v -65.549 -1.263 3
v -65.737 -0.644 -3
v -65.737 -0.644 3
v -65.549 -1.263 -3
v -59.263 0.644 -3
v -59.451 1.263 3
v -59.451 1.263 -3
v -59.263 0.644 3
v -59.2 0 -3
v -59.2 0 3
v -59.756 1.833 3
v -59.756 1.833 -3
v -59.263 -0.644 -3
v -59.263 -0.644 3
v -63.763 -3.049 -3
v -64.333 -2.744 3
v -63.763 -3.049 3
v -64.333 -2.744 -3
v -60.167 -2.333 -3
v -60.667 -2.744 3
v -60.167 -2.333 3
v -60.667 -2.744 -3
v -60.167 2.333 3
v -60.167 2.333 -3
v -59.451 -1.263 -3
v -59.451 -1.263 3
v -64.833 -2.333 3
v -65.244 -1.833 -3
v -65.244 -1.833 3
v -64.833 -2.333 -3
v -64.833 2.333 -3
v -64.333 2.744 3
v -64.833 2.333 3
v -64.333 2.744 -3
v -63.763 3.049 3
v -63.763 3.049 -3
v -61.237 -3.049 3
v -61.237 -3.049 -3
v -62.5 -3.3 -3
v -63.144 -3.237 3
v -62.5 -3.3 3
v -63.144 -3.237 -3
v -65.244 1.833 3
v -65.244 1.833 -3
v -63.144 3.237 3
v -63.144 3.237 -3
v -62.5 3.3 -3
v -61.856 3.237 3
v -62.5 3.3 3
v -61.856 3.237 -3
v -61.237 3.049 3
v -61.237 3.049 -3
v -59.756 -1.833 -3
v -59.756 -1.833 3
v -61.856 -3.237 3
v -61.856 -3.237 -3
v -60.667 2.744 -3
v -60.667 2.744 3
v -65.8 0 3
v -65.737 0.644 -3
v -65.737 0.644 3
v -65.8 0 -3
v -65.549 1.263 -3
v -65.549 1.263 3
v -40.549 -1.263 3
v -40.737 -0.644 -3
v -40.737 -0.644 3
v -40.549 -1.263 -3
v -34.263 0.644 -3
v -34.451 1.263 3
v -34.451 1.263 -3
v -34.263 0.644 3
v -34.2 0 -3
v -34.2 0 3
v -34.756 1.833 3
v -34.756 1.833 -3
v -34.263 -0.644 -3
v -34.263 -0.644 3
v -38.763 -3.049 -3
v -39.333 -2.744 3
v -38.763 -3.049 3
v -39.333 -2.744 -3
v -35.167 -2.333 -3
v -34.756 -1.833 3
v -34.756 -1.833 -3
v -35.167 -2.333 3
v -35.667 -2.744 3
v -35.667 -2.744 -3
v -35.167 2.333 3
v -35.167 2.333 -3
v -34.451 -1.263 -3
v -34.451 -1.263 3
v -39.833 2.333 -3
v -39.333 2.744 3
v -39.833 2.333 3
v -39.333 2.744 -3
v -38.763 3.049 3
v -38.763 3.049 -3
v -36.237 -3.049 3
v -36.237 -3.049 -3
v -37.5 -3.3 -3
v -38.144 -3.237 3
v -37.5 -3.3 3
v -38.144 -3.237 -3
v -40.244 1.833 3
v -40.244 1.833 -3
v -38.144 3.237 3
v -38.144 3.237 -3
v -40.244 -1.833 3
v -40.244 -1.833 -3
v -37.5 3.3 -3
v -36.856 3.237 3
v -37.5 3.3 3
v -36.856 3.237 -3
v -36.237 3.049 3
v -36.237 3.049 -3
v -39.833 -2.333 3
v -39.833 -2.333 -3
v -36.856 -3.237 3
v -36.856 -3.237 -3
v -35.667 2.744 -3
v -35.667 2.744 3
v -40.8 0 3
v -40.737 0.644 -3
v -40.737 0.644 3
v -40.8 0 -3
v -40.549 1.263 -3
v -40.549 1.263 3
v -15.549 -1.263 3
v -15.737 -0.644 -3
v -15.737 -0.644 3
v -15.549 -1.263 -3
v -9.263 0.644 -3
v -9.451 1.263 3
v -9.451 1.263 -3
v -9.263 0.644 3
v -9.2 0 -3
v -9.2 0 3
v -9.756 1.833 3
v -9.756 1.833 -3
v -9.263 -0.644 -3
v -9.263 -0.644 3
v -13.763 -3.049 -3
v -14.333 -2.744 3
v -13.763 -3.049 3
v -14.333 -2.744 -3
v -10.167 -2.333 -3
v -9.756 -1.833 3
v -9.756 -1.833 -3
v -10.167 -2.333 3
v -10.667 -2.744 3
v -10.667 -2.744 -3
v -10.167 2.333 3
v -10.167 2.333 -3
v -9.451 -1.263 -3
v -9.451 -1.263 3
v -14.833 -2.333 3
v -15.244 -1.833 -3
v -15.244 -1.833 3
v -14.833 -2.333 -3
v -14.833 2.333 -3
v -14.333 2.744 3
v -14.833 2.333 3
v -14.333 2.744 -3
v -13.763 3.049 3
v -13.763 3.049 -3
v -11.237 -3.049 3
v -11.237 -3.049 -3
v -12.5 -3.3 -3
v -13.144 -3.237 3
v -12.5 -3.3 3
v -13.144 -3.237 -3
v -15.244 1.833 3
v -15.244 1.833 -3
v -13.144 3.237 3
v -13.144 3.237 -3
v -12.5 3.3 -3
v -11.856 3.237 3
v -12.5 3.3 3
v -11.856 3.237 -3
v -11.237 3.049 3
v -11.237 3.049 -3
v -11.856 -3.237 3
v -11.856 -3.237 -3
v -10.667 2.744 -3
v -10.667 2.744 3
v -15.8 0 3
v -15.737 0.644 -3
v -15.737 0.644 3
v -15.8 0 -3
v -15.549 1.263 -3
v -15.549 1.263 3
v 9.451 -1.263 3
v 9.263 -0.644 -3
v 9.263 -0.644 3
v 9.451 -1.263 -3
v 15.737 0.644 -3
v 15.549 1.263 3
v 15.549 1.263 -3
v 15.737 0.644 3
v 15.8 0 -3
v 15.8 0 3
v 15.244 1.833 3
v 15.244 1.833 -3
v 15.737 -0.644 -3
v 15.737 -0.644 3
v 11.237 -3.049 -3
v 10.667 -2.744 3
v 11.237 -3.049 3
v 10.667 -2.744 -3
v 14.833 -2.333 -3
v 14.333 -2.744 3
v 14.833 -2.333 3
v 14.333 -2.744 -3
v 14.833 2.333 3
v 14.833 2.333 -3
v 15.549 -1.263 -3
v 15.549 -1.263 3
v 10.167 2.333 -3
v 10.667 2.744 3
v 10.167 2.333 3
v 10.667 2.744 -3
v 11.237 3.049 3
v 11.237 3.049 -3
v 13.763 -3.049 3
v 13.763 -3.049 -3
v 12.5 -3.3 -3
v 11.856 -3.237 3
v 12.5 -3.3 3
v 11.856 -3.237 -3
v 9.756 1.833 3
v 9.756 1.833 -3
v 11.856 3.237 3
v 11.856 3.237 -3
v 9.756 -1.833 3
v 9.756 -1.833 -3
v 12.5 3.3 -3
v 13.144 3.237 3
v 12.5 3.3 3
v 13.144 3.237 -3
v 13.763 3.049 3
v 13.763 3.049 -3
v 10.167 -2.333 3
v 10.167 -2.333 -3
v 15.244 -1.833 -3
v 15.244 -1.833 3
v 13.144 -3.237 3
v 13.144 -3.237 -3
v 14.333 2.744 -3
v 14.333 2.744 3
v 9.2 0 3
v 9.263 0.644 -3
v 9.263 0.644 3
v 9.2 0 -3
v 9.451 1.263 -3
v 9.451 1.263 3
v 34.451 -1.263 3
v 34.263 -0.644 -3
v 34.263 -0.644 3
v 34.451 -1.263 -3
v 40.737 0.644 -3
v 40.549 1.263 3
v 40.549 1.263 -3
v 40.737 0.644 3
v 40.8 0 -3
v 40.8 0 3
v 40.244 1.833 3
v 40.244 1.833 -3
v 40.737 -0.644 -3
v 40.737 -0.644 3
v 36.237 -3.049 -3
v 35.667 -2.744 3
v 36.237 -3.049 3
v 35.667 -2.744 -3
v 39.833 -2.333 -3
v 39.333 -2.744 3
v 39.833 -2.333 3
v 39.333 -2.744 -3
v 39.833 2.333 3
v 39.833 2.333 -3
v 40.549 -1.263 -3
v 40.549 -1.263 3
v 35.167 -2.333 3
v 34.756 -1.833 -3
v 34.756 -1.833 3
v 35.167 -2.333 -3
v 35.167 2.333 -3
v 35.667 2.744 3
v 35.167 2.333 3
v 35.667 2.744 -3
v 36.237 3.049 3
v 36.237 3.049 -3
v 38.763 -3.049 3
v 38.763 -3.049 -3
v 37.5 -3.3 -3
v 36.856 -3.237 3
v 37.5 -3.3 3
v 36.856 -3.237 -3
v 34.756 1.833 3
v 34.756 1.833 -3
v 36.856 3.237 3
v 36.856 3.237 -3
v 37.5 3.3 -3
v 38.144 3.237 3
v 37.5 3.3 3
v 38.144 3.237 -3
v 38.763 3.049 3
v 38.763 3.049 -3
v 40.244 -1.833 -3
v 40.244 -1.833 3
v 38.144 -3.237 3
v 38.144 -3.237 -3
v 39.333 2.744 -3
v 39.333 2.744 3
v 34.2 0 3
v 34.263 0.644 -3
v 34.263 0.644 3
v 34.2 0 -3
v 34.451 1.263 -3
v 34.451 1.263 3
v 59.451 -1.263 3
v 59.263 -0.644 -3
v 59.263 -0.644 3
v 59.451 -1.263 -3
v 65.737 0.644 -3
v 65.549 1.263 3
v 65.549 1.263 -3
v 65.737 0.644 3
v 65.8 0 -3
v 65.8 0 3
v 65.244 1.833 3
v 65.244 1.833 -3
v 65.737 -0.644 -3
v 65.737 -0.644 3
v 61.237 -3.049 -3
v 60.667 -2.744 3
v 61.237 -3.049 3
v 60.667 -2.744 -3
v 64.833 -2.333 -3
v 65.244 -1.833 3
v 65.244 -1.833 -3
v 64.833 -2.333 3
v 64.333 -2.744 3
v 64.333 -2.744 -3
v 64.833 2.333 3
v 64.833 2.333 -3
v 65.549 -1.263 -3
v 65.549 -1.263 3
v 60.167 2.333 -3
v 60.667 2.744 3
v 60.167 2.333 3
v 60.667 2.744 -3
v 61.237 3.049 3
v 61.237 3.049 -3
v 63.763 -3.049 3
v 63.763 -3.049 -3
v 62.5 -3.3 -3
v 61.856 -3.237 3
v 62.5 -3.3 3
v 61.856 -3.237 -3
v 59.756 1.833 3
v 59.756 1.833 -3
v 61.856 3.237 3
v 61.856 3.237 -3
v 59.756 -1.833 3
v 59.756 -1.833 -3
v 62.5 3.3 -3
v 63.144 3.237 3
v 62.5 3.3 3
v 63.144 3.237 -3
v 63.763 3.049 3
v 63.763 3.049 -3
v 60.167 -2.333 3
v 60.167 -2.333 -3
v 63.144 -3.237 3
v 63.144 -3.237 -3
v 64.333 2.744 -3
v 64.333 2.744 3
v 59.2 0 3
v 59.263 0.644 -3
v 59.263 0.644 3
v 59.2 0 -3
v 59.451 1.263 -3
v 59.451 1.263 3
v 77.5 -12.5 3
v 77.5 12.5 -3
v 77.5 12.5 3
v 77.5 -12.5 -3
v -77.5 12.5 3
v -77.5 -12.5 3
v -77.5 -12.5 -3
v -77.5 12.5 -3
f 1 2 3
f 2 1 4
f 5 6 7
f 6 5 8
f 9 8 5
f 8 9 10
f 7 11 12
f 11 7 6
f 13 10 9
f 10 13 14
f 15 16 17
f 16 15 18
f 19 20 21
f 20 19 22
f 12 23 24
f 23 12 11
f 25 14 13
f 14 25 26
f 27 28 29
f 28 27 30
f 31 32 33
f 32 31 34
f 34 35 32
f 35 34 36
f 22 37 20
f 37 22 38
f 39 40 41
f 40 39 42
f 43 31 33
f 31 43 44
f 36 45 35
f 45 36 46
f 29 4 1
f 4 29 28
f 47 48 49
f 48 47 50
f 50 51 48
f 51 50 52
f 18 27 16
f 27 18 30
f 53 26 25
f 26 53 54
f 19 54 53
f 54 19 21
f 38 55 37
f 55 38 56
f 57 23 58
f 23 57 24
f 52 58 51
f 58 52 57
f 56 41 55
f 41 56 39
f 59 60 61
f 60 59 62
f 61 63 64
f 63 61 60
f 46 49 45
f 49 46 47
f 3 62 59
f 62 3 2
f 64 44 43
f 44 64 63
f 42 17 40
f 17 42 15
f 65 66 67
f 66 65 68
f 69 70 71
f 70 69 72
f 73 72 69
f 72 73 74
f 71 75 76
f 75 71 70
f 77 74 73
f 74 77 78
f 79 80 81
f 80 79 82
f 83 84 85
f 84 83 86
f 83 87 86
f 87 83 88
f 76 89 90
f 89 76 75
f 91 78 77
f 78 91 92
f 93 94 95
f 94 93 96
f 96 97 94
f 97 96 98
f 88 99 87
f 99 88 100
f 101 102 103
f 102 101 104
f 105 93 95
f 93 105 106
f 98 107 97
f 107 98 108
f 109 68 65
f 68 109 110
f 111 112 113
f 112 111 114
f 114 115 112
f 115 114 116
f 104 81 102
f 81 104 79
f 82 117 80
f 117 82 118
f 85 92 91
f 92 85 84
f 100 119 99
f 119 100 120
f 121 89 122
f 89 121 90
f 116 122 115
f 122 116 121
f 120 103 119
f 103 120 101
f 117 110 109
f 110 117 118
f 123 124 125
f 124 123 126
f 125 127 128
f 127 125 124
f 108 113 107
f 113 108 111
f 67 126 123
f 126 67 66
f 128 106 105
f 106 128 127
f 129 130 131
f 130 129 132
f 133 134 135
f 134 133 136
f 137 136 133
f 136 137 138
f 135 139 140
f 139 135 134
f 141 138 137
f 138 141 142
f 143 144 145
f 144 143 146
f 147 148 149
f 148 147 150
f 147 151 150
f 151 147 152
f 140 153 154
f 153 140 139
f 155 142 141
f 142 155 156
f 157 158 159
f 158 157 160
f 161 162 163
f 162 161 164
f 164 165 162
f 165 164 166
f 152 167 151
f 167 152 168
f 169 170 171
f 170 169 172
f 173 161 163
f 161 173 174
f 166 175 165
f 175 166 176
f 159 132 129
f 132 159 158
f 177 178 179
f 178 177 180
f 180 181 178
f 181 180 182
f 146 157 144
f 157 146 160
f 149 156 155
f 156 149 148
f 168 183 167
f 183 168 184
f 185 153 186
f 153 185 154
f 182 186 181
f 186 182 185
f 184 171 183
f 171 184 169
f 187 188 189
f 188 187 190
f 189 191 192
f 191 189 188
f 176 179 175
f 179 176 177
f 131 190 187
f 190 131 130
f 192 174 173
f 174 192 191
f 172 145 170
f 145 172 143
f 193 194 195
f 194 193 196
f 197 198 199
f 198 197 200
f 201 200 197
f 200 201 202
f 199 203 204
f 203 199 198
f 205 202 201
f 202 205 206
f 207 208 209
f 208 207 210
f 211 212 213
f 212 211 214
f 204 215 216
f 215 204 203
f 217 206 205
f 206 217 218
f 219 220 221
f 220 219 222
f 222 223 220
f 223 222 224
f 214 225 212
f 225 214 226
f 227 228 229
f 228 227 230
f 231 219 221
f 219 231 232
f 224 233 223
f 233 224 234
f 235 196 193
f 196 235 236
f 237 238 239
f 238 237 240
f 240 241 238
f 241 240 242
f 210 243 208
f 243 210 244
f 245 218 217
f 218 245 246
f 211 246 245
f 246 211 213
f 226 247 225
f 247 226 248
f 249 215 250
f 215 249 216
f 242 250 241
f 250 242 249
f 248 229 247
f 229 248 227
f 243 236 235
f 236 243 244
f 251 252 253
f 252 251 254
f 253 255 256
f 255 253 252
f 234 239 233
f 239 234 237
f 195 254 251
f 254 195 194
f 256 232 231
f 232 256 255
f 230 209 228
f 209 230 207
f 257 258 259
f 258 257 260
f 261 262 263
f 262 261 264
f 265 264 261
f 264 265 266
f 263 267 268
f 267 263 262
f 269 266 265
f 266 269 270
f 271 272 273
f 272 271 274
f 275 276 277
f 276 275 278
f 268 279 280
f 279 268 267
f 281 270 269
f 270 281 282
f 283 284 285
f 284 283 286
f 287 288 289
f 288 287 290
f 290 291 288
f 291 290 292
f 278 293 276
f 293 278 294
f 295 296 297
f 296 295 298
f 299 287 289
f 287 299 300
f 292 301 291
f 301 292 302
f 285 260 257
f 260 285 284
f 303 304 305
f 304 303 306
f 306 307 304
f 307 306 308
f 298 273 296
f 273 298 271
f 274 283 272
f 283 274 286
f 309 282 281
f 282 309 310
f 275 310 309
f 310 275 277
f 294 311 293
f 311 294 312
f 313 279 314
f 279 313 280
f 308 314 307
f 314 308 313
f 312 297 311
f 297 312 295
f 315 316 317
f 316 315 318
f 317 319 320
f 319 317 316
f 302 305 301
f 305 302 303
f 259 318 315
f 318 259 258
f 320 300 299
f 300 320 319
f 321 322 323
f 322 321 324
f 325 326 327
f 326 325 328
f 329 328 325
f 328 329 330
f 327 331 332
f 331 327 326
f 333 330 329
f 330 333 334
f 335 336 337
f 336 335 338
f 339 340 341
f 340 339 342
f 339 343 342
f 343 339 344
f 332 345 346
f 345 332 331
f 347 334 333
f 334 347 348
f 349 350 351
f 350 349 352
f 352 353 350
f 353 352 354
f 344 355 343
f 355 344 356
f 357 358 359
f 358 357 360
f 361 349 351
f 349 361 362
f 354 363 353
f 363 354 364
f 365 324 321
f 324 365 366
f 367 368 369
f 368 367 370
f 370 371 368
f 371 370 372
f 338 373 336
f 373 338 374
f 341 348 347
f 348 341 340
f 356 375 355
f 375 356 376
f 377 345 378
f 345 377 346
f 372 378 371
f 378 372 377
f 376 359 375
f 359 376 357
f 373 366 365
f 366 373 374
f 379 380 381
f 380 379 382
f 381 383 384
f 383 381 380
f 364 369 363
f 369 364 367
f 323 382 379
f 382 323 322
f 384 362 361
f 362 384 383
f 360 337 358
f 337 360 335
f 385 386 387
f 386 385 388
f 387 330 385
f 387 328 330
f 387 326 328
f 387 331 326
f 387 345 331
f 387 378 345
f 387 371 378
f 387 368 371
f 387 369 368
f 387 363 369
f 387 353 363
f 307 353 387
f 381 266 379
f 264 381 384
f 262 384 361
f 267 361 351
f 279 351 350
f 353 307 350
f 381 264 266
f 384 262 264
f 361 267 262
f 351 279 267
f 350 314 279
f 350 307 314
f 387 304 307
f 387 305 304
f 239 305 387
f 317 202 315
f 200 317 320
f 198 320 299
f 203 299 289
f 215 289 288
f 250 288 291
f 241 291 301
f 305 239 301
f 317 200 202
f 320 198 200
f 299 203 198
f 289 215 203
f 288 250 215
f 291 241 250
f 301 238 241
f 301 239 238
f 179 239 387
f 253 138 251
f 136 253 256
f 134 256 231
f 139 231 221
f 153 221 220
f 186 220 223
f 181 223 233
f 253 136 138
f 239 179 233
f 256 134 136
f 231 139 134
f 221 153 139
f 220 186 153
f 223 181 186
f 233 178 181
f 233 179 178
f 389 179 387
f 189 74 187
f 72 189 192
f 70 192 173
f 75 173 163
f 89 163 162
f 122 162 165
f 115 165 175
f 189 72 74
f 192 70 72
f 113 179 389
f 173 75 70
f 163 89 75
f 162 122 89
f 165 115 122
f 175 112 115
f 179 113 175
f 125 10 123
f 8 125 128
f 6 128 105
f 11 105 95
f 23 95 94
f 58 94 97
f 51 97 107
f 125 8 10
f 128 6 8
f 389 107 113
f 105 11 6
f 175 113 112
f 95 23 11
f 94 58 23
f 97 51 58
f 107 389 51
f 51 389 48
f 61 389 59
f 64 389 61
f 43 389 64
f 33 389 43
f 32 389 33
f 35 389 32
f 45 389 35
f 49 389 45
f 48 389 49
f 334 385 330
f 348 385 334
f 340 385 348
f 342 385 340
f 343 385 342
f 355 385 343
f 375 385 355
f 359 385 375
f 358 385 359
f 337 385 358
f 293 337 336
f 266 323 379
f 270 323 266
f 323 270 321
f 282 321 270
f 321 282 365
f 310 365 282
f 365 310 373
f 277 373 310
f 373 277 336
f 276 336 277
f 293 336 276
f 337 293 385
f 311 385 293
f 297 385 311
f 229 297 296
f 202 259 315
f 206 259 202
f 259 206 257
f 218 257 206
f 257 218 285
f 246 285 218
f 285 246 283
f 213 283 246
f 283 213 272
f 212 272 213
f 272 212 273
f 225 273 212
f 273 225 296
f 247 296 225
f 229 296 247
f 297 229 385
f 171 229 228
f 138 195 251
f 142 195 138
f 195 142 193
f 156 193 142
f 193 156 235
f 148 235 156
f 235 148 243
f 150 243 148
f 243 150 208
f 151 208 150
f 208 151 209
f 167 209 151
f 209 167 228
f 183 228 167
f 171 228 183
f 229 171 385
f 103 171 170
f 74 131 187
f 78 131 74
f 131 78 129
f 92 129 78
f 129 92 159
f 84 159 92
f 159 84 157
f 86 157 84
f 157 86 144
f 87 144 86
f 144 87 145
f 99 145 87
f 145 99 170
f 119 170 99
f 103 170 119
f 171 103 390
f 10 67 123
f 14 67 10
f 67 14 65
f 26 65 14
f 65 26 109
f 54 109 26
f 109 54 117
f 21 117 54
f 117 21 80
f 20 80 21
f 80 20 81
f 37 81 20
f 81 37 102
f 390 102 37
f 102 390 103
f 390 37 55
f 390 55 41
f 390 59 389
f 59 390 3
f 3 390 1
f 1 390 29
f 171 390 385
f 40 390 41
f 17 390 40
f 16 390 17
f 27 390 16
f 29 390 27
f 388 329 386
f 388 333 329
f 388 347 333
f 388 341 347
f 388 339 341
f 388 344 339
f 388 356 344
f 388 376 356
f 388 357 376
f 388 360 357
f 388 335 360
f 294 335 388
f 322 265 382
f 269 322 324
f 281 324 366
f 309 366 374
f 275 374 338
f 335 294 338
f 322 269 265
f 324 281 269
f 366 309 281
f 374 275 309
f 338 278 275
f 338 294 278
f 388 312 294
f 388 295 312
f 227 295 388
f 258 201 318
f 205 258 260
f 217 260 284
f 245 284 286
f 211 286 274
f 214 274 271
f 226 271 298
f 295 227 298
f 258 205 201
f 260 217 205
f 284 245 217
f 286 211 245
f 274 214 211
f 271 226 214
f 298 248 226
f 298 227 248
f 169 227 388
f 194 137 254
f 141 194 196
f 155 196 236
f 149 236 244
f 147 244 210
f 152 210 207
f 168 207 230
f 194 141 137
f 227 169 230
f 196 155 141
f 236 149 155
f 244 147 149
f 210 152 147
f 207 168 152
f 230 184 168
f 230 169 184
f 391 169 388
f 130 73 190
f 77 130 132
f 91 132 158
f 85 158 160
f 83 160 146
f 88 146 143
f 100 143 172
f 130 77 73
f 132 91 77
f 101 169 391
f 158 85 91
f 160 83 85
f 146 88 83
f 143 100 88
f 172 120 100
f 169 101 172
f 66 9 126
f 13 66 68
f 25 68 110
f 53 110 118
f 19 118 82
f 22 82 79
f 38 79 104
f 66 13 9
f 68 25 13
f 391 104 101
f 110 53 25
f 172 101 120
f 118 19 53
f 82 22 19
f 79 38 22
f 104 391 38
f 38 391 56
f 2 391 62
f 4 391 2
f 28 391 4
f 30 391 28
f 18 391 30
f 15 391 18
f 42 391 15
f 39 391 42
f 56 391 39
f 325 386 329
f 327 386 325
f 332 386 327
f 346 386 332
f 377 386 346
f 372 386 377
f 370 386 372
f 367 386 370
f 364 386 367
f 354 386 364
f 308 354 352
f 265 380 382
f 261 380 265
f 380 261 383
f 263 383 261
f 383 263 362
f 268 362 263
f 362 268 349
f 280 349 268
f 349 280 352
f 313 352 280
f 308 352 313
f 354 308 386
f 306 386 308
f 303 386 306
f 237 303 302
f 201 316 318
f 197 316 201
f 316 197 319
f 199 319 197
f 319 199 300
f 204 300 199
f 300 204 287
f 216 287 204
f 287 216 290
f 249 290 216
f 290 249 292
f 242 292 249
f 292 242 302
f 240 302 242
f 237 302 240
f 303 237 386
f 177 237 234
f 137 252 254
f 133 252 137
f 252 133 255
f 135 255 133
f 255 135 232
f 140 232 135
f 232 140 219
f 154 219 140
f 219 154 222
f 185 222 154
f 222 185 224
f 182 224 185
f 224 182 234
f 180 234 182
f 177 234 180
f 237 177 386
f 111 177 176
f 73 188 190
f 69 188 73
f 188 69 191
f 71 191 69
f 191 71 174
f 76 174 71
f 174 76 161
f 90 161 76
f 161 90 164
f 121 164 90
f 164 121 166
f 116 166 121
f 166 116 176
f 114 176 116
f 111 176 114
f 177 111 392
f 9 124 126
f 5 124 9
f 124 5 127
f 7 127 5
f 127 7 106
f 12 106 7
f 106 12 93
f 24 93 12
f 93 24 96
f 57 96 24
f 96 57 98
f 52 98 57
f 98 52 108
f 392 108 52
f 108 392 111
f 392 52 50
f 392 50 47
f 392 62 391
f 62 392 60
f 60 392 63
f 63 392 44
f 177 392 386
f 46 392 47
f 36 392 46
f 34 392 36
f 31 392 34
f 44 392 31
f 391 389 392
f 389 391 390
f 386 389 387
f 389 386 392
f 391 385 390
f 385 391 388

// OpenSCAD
$fn = 32;

// ----------------------------------------------------------------------
// Hole bar, 6 x Ø6.6
// row layout, 15 mm edge offset
// ----------------------------------------------------------------------

// --- parameters (mm) ---
bar_w = 25;    // bar width (Y)
bar_t = 6;     // bar thickness (Z)
holes = 6;     // holes per row
hole_d = 6.6;  // hole diameter
edge = 15;     // offset from the bar end to the first hole
pitch = 25;    // pitch between neighbouring holes

// --- derived feature positions (mm) ---
span = (holes - 1) * pitch;   // = 125   distance between the end holes
bar_l = span + 2 * edge;      // = 155   overall bar length
start_x = -bar_l / 2 + edge;  // = -62.5   X of the first hole
feature_centers = [
  [start_x + 0 * pitch, 0],
  [start_x + 1 * pitch, 0],
  [start_x + 2 * pitch, 0],
  [start_x + 3 * pitch, 0],
  [start_x + 4 * pitch, 0],
  [start_x + 5 * pitch, 0]
];   // hole centres of the first row

// bar with one row of holes, drilled from feature_centers
difference() {
  translate([-bar_l / 2, -bar_w / 2, -bar_t / 2]) cube([bar_l, bar_w, bar_t]);
  for (centre = feature_centers)
    translate([centre[0], centre[1], 0])
      cylinder(d = hole_d, h = bar_t + 2, center = true);
}
